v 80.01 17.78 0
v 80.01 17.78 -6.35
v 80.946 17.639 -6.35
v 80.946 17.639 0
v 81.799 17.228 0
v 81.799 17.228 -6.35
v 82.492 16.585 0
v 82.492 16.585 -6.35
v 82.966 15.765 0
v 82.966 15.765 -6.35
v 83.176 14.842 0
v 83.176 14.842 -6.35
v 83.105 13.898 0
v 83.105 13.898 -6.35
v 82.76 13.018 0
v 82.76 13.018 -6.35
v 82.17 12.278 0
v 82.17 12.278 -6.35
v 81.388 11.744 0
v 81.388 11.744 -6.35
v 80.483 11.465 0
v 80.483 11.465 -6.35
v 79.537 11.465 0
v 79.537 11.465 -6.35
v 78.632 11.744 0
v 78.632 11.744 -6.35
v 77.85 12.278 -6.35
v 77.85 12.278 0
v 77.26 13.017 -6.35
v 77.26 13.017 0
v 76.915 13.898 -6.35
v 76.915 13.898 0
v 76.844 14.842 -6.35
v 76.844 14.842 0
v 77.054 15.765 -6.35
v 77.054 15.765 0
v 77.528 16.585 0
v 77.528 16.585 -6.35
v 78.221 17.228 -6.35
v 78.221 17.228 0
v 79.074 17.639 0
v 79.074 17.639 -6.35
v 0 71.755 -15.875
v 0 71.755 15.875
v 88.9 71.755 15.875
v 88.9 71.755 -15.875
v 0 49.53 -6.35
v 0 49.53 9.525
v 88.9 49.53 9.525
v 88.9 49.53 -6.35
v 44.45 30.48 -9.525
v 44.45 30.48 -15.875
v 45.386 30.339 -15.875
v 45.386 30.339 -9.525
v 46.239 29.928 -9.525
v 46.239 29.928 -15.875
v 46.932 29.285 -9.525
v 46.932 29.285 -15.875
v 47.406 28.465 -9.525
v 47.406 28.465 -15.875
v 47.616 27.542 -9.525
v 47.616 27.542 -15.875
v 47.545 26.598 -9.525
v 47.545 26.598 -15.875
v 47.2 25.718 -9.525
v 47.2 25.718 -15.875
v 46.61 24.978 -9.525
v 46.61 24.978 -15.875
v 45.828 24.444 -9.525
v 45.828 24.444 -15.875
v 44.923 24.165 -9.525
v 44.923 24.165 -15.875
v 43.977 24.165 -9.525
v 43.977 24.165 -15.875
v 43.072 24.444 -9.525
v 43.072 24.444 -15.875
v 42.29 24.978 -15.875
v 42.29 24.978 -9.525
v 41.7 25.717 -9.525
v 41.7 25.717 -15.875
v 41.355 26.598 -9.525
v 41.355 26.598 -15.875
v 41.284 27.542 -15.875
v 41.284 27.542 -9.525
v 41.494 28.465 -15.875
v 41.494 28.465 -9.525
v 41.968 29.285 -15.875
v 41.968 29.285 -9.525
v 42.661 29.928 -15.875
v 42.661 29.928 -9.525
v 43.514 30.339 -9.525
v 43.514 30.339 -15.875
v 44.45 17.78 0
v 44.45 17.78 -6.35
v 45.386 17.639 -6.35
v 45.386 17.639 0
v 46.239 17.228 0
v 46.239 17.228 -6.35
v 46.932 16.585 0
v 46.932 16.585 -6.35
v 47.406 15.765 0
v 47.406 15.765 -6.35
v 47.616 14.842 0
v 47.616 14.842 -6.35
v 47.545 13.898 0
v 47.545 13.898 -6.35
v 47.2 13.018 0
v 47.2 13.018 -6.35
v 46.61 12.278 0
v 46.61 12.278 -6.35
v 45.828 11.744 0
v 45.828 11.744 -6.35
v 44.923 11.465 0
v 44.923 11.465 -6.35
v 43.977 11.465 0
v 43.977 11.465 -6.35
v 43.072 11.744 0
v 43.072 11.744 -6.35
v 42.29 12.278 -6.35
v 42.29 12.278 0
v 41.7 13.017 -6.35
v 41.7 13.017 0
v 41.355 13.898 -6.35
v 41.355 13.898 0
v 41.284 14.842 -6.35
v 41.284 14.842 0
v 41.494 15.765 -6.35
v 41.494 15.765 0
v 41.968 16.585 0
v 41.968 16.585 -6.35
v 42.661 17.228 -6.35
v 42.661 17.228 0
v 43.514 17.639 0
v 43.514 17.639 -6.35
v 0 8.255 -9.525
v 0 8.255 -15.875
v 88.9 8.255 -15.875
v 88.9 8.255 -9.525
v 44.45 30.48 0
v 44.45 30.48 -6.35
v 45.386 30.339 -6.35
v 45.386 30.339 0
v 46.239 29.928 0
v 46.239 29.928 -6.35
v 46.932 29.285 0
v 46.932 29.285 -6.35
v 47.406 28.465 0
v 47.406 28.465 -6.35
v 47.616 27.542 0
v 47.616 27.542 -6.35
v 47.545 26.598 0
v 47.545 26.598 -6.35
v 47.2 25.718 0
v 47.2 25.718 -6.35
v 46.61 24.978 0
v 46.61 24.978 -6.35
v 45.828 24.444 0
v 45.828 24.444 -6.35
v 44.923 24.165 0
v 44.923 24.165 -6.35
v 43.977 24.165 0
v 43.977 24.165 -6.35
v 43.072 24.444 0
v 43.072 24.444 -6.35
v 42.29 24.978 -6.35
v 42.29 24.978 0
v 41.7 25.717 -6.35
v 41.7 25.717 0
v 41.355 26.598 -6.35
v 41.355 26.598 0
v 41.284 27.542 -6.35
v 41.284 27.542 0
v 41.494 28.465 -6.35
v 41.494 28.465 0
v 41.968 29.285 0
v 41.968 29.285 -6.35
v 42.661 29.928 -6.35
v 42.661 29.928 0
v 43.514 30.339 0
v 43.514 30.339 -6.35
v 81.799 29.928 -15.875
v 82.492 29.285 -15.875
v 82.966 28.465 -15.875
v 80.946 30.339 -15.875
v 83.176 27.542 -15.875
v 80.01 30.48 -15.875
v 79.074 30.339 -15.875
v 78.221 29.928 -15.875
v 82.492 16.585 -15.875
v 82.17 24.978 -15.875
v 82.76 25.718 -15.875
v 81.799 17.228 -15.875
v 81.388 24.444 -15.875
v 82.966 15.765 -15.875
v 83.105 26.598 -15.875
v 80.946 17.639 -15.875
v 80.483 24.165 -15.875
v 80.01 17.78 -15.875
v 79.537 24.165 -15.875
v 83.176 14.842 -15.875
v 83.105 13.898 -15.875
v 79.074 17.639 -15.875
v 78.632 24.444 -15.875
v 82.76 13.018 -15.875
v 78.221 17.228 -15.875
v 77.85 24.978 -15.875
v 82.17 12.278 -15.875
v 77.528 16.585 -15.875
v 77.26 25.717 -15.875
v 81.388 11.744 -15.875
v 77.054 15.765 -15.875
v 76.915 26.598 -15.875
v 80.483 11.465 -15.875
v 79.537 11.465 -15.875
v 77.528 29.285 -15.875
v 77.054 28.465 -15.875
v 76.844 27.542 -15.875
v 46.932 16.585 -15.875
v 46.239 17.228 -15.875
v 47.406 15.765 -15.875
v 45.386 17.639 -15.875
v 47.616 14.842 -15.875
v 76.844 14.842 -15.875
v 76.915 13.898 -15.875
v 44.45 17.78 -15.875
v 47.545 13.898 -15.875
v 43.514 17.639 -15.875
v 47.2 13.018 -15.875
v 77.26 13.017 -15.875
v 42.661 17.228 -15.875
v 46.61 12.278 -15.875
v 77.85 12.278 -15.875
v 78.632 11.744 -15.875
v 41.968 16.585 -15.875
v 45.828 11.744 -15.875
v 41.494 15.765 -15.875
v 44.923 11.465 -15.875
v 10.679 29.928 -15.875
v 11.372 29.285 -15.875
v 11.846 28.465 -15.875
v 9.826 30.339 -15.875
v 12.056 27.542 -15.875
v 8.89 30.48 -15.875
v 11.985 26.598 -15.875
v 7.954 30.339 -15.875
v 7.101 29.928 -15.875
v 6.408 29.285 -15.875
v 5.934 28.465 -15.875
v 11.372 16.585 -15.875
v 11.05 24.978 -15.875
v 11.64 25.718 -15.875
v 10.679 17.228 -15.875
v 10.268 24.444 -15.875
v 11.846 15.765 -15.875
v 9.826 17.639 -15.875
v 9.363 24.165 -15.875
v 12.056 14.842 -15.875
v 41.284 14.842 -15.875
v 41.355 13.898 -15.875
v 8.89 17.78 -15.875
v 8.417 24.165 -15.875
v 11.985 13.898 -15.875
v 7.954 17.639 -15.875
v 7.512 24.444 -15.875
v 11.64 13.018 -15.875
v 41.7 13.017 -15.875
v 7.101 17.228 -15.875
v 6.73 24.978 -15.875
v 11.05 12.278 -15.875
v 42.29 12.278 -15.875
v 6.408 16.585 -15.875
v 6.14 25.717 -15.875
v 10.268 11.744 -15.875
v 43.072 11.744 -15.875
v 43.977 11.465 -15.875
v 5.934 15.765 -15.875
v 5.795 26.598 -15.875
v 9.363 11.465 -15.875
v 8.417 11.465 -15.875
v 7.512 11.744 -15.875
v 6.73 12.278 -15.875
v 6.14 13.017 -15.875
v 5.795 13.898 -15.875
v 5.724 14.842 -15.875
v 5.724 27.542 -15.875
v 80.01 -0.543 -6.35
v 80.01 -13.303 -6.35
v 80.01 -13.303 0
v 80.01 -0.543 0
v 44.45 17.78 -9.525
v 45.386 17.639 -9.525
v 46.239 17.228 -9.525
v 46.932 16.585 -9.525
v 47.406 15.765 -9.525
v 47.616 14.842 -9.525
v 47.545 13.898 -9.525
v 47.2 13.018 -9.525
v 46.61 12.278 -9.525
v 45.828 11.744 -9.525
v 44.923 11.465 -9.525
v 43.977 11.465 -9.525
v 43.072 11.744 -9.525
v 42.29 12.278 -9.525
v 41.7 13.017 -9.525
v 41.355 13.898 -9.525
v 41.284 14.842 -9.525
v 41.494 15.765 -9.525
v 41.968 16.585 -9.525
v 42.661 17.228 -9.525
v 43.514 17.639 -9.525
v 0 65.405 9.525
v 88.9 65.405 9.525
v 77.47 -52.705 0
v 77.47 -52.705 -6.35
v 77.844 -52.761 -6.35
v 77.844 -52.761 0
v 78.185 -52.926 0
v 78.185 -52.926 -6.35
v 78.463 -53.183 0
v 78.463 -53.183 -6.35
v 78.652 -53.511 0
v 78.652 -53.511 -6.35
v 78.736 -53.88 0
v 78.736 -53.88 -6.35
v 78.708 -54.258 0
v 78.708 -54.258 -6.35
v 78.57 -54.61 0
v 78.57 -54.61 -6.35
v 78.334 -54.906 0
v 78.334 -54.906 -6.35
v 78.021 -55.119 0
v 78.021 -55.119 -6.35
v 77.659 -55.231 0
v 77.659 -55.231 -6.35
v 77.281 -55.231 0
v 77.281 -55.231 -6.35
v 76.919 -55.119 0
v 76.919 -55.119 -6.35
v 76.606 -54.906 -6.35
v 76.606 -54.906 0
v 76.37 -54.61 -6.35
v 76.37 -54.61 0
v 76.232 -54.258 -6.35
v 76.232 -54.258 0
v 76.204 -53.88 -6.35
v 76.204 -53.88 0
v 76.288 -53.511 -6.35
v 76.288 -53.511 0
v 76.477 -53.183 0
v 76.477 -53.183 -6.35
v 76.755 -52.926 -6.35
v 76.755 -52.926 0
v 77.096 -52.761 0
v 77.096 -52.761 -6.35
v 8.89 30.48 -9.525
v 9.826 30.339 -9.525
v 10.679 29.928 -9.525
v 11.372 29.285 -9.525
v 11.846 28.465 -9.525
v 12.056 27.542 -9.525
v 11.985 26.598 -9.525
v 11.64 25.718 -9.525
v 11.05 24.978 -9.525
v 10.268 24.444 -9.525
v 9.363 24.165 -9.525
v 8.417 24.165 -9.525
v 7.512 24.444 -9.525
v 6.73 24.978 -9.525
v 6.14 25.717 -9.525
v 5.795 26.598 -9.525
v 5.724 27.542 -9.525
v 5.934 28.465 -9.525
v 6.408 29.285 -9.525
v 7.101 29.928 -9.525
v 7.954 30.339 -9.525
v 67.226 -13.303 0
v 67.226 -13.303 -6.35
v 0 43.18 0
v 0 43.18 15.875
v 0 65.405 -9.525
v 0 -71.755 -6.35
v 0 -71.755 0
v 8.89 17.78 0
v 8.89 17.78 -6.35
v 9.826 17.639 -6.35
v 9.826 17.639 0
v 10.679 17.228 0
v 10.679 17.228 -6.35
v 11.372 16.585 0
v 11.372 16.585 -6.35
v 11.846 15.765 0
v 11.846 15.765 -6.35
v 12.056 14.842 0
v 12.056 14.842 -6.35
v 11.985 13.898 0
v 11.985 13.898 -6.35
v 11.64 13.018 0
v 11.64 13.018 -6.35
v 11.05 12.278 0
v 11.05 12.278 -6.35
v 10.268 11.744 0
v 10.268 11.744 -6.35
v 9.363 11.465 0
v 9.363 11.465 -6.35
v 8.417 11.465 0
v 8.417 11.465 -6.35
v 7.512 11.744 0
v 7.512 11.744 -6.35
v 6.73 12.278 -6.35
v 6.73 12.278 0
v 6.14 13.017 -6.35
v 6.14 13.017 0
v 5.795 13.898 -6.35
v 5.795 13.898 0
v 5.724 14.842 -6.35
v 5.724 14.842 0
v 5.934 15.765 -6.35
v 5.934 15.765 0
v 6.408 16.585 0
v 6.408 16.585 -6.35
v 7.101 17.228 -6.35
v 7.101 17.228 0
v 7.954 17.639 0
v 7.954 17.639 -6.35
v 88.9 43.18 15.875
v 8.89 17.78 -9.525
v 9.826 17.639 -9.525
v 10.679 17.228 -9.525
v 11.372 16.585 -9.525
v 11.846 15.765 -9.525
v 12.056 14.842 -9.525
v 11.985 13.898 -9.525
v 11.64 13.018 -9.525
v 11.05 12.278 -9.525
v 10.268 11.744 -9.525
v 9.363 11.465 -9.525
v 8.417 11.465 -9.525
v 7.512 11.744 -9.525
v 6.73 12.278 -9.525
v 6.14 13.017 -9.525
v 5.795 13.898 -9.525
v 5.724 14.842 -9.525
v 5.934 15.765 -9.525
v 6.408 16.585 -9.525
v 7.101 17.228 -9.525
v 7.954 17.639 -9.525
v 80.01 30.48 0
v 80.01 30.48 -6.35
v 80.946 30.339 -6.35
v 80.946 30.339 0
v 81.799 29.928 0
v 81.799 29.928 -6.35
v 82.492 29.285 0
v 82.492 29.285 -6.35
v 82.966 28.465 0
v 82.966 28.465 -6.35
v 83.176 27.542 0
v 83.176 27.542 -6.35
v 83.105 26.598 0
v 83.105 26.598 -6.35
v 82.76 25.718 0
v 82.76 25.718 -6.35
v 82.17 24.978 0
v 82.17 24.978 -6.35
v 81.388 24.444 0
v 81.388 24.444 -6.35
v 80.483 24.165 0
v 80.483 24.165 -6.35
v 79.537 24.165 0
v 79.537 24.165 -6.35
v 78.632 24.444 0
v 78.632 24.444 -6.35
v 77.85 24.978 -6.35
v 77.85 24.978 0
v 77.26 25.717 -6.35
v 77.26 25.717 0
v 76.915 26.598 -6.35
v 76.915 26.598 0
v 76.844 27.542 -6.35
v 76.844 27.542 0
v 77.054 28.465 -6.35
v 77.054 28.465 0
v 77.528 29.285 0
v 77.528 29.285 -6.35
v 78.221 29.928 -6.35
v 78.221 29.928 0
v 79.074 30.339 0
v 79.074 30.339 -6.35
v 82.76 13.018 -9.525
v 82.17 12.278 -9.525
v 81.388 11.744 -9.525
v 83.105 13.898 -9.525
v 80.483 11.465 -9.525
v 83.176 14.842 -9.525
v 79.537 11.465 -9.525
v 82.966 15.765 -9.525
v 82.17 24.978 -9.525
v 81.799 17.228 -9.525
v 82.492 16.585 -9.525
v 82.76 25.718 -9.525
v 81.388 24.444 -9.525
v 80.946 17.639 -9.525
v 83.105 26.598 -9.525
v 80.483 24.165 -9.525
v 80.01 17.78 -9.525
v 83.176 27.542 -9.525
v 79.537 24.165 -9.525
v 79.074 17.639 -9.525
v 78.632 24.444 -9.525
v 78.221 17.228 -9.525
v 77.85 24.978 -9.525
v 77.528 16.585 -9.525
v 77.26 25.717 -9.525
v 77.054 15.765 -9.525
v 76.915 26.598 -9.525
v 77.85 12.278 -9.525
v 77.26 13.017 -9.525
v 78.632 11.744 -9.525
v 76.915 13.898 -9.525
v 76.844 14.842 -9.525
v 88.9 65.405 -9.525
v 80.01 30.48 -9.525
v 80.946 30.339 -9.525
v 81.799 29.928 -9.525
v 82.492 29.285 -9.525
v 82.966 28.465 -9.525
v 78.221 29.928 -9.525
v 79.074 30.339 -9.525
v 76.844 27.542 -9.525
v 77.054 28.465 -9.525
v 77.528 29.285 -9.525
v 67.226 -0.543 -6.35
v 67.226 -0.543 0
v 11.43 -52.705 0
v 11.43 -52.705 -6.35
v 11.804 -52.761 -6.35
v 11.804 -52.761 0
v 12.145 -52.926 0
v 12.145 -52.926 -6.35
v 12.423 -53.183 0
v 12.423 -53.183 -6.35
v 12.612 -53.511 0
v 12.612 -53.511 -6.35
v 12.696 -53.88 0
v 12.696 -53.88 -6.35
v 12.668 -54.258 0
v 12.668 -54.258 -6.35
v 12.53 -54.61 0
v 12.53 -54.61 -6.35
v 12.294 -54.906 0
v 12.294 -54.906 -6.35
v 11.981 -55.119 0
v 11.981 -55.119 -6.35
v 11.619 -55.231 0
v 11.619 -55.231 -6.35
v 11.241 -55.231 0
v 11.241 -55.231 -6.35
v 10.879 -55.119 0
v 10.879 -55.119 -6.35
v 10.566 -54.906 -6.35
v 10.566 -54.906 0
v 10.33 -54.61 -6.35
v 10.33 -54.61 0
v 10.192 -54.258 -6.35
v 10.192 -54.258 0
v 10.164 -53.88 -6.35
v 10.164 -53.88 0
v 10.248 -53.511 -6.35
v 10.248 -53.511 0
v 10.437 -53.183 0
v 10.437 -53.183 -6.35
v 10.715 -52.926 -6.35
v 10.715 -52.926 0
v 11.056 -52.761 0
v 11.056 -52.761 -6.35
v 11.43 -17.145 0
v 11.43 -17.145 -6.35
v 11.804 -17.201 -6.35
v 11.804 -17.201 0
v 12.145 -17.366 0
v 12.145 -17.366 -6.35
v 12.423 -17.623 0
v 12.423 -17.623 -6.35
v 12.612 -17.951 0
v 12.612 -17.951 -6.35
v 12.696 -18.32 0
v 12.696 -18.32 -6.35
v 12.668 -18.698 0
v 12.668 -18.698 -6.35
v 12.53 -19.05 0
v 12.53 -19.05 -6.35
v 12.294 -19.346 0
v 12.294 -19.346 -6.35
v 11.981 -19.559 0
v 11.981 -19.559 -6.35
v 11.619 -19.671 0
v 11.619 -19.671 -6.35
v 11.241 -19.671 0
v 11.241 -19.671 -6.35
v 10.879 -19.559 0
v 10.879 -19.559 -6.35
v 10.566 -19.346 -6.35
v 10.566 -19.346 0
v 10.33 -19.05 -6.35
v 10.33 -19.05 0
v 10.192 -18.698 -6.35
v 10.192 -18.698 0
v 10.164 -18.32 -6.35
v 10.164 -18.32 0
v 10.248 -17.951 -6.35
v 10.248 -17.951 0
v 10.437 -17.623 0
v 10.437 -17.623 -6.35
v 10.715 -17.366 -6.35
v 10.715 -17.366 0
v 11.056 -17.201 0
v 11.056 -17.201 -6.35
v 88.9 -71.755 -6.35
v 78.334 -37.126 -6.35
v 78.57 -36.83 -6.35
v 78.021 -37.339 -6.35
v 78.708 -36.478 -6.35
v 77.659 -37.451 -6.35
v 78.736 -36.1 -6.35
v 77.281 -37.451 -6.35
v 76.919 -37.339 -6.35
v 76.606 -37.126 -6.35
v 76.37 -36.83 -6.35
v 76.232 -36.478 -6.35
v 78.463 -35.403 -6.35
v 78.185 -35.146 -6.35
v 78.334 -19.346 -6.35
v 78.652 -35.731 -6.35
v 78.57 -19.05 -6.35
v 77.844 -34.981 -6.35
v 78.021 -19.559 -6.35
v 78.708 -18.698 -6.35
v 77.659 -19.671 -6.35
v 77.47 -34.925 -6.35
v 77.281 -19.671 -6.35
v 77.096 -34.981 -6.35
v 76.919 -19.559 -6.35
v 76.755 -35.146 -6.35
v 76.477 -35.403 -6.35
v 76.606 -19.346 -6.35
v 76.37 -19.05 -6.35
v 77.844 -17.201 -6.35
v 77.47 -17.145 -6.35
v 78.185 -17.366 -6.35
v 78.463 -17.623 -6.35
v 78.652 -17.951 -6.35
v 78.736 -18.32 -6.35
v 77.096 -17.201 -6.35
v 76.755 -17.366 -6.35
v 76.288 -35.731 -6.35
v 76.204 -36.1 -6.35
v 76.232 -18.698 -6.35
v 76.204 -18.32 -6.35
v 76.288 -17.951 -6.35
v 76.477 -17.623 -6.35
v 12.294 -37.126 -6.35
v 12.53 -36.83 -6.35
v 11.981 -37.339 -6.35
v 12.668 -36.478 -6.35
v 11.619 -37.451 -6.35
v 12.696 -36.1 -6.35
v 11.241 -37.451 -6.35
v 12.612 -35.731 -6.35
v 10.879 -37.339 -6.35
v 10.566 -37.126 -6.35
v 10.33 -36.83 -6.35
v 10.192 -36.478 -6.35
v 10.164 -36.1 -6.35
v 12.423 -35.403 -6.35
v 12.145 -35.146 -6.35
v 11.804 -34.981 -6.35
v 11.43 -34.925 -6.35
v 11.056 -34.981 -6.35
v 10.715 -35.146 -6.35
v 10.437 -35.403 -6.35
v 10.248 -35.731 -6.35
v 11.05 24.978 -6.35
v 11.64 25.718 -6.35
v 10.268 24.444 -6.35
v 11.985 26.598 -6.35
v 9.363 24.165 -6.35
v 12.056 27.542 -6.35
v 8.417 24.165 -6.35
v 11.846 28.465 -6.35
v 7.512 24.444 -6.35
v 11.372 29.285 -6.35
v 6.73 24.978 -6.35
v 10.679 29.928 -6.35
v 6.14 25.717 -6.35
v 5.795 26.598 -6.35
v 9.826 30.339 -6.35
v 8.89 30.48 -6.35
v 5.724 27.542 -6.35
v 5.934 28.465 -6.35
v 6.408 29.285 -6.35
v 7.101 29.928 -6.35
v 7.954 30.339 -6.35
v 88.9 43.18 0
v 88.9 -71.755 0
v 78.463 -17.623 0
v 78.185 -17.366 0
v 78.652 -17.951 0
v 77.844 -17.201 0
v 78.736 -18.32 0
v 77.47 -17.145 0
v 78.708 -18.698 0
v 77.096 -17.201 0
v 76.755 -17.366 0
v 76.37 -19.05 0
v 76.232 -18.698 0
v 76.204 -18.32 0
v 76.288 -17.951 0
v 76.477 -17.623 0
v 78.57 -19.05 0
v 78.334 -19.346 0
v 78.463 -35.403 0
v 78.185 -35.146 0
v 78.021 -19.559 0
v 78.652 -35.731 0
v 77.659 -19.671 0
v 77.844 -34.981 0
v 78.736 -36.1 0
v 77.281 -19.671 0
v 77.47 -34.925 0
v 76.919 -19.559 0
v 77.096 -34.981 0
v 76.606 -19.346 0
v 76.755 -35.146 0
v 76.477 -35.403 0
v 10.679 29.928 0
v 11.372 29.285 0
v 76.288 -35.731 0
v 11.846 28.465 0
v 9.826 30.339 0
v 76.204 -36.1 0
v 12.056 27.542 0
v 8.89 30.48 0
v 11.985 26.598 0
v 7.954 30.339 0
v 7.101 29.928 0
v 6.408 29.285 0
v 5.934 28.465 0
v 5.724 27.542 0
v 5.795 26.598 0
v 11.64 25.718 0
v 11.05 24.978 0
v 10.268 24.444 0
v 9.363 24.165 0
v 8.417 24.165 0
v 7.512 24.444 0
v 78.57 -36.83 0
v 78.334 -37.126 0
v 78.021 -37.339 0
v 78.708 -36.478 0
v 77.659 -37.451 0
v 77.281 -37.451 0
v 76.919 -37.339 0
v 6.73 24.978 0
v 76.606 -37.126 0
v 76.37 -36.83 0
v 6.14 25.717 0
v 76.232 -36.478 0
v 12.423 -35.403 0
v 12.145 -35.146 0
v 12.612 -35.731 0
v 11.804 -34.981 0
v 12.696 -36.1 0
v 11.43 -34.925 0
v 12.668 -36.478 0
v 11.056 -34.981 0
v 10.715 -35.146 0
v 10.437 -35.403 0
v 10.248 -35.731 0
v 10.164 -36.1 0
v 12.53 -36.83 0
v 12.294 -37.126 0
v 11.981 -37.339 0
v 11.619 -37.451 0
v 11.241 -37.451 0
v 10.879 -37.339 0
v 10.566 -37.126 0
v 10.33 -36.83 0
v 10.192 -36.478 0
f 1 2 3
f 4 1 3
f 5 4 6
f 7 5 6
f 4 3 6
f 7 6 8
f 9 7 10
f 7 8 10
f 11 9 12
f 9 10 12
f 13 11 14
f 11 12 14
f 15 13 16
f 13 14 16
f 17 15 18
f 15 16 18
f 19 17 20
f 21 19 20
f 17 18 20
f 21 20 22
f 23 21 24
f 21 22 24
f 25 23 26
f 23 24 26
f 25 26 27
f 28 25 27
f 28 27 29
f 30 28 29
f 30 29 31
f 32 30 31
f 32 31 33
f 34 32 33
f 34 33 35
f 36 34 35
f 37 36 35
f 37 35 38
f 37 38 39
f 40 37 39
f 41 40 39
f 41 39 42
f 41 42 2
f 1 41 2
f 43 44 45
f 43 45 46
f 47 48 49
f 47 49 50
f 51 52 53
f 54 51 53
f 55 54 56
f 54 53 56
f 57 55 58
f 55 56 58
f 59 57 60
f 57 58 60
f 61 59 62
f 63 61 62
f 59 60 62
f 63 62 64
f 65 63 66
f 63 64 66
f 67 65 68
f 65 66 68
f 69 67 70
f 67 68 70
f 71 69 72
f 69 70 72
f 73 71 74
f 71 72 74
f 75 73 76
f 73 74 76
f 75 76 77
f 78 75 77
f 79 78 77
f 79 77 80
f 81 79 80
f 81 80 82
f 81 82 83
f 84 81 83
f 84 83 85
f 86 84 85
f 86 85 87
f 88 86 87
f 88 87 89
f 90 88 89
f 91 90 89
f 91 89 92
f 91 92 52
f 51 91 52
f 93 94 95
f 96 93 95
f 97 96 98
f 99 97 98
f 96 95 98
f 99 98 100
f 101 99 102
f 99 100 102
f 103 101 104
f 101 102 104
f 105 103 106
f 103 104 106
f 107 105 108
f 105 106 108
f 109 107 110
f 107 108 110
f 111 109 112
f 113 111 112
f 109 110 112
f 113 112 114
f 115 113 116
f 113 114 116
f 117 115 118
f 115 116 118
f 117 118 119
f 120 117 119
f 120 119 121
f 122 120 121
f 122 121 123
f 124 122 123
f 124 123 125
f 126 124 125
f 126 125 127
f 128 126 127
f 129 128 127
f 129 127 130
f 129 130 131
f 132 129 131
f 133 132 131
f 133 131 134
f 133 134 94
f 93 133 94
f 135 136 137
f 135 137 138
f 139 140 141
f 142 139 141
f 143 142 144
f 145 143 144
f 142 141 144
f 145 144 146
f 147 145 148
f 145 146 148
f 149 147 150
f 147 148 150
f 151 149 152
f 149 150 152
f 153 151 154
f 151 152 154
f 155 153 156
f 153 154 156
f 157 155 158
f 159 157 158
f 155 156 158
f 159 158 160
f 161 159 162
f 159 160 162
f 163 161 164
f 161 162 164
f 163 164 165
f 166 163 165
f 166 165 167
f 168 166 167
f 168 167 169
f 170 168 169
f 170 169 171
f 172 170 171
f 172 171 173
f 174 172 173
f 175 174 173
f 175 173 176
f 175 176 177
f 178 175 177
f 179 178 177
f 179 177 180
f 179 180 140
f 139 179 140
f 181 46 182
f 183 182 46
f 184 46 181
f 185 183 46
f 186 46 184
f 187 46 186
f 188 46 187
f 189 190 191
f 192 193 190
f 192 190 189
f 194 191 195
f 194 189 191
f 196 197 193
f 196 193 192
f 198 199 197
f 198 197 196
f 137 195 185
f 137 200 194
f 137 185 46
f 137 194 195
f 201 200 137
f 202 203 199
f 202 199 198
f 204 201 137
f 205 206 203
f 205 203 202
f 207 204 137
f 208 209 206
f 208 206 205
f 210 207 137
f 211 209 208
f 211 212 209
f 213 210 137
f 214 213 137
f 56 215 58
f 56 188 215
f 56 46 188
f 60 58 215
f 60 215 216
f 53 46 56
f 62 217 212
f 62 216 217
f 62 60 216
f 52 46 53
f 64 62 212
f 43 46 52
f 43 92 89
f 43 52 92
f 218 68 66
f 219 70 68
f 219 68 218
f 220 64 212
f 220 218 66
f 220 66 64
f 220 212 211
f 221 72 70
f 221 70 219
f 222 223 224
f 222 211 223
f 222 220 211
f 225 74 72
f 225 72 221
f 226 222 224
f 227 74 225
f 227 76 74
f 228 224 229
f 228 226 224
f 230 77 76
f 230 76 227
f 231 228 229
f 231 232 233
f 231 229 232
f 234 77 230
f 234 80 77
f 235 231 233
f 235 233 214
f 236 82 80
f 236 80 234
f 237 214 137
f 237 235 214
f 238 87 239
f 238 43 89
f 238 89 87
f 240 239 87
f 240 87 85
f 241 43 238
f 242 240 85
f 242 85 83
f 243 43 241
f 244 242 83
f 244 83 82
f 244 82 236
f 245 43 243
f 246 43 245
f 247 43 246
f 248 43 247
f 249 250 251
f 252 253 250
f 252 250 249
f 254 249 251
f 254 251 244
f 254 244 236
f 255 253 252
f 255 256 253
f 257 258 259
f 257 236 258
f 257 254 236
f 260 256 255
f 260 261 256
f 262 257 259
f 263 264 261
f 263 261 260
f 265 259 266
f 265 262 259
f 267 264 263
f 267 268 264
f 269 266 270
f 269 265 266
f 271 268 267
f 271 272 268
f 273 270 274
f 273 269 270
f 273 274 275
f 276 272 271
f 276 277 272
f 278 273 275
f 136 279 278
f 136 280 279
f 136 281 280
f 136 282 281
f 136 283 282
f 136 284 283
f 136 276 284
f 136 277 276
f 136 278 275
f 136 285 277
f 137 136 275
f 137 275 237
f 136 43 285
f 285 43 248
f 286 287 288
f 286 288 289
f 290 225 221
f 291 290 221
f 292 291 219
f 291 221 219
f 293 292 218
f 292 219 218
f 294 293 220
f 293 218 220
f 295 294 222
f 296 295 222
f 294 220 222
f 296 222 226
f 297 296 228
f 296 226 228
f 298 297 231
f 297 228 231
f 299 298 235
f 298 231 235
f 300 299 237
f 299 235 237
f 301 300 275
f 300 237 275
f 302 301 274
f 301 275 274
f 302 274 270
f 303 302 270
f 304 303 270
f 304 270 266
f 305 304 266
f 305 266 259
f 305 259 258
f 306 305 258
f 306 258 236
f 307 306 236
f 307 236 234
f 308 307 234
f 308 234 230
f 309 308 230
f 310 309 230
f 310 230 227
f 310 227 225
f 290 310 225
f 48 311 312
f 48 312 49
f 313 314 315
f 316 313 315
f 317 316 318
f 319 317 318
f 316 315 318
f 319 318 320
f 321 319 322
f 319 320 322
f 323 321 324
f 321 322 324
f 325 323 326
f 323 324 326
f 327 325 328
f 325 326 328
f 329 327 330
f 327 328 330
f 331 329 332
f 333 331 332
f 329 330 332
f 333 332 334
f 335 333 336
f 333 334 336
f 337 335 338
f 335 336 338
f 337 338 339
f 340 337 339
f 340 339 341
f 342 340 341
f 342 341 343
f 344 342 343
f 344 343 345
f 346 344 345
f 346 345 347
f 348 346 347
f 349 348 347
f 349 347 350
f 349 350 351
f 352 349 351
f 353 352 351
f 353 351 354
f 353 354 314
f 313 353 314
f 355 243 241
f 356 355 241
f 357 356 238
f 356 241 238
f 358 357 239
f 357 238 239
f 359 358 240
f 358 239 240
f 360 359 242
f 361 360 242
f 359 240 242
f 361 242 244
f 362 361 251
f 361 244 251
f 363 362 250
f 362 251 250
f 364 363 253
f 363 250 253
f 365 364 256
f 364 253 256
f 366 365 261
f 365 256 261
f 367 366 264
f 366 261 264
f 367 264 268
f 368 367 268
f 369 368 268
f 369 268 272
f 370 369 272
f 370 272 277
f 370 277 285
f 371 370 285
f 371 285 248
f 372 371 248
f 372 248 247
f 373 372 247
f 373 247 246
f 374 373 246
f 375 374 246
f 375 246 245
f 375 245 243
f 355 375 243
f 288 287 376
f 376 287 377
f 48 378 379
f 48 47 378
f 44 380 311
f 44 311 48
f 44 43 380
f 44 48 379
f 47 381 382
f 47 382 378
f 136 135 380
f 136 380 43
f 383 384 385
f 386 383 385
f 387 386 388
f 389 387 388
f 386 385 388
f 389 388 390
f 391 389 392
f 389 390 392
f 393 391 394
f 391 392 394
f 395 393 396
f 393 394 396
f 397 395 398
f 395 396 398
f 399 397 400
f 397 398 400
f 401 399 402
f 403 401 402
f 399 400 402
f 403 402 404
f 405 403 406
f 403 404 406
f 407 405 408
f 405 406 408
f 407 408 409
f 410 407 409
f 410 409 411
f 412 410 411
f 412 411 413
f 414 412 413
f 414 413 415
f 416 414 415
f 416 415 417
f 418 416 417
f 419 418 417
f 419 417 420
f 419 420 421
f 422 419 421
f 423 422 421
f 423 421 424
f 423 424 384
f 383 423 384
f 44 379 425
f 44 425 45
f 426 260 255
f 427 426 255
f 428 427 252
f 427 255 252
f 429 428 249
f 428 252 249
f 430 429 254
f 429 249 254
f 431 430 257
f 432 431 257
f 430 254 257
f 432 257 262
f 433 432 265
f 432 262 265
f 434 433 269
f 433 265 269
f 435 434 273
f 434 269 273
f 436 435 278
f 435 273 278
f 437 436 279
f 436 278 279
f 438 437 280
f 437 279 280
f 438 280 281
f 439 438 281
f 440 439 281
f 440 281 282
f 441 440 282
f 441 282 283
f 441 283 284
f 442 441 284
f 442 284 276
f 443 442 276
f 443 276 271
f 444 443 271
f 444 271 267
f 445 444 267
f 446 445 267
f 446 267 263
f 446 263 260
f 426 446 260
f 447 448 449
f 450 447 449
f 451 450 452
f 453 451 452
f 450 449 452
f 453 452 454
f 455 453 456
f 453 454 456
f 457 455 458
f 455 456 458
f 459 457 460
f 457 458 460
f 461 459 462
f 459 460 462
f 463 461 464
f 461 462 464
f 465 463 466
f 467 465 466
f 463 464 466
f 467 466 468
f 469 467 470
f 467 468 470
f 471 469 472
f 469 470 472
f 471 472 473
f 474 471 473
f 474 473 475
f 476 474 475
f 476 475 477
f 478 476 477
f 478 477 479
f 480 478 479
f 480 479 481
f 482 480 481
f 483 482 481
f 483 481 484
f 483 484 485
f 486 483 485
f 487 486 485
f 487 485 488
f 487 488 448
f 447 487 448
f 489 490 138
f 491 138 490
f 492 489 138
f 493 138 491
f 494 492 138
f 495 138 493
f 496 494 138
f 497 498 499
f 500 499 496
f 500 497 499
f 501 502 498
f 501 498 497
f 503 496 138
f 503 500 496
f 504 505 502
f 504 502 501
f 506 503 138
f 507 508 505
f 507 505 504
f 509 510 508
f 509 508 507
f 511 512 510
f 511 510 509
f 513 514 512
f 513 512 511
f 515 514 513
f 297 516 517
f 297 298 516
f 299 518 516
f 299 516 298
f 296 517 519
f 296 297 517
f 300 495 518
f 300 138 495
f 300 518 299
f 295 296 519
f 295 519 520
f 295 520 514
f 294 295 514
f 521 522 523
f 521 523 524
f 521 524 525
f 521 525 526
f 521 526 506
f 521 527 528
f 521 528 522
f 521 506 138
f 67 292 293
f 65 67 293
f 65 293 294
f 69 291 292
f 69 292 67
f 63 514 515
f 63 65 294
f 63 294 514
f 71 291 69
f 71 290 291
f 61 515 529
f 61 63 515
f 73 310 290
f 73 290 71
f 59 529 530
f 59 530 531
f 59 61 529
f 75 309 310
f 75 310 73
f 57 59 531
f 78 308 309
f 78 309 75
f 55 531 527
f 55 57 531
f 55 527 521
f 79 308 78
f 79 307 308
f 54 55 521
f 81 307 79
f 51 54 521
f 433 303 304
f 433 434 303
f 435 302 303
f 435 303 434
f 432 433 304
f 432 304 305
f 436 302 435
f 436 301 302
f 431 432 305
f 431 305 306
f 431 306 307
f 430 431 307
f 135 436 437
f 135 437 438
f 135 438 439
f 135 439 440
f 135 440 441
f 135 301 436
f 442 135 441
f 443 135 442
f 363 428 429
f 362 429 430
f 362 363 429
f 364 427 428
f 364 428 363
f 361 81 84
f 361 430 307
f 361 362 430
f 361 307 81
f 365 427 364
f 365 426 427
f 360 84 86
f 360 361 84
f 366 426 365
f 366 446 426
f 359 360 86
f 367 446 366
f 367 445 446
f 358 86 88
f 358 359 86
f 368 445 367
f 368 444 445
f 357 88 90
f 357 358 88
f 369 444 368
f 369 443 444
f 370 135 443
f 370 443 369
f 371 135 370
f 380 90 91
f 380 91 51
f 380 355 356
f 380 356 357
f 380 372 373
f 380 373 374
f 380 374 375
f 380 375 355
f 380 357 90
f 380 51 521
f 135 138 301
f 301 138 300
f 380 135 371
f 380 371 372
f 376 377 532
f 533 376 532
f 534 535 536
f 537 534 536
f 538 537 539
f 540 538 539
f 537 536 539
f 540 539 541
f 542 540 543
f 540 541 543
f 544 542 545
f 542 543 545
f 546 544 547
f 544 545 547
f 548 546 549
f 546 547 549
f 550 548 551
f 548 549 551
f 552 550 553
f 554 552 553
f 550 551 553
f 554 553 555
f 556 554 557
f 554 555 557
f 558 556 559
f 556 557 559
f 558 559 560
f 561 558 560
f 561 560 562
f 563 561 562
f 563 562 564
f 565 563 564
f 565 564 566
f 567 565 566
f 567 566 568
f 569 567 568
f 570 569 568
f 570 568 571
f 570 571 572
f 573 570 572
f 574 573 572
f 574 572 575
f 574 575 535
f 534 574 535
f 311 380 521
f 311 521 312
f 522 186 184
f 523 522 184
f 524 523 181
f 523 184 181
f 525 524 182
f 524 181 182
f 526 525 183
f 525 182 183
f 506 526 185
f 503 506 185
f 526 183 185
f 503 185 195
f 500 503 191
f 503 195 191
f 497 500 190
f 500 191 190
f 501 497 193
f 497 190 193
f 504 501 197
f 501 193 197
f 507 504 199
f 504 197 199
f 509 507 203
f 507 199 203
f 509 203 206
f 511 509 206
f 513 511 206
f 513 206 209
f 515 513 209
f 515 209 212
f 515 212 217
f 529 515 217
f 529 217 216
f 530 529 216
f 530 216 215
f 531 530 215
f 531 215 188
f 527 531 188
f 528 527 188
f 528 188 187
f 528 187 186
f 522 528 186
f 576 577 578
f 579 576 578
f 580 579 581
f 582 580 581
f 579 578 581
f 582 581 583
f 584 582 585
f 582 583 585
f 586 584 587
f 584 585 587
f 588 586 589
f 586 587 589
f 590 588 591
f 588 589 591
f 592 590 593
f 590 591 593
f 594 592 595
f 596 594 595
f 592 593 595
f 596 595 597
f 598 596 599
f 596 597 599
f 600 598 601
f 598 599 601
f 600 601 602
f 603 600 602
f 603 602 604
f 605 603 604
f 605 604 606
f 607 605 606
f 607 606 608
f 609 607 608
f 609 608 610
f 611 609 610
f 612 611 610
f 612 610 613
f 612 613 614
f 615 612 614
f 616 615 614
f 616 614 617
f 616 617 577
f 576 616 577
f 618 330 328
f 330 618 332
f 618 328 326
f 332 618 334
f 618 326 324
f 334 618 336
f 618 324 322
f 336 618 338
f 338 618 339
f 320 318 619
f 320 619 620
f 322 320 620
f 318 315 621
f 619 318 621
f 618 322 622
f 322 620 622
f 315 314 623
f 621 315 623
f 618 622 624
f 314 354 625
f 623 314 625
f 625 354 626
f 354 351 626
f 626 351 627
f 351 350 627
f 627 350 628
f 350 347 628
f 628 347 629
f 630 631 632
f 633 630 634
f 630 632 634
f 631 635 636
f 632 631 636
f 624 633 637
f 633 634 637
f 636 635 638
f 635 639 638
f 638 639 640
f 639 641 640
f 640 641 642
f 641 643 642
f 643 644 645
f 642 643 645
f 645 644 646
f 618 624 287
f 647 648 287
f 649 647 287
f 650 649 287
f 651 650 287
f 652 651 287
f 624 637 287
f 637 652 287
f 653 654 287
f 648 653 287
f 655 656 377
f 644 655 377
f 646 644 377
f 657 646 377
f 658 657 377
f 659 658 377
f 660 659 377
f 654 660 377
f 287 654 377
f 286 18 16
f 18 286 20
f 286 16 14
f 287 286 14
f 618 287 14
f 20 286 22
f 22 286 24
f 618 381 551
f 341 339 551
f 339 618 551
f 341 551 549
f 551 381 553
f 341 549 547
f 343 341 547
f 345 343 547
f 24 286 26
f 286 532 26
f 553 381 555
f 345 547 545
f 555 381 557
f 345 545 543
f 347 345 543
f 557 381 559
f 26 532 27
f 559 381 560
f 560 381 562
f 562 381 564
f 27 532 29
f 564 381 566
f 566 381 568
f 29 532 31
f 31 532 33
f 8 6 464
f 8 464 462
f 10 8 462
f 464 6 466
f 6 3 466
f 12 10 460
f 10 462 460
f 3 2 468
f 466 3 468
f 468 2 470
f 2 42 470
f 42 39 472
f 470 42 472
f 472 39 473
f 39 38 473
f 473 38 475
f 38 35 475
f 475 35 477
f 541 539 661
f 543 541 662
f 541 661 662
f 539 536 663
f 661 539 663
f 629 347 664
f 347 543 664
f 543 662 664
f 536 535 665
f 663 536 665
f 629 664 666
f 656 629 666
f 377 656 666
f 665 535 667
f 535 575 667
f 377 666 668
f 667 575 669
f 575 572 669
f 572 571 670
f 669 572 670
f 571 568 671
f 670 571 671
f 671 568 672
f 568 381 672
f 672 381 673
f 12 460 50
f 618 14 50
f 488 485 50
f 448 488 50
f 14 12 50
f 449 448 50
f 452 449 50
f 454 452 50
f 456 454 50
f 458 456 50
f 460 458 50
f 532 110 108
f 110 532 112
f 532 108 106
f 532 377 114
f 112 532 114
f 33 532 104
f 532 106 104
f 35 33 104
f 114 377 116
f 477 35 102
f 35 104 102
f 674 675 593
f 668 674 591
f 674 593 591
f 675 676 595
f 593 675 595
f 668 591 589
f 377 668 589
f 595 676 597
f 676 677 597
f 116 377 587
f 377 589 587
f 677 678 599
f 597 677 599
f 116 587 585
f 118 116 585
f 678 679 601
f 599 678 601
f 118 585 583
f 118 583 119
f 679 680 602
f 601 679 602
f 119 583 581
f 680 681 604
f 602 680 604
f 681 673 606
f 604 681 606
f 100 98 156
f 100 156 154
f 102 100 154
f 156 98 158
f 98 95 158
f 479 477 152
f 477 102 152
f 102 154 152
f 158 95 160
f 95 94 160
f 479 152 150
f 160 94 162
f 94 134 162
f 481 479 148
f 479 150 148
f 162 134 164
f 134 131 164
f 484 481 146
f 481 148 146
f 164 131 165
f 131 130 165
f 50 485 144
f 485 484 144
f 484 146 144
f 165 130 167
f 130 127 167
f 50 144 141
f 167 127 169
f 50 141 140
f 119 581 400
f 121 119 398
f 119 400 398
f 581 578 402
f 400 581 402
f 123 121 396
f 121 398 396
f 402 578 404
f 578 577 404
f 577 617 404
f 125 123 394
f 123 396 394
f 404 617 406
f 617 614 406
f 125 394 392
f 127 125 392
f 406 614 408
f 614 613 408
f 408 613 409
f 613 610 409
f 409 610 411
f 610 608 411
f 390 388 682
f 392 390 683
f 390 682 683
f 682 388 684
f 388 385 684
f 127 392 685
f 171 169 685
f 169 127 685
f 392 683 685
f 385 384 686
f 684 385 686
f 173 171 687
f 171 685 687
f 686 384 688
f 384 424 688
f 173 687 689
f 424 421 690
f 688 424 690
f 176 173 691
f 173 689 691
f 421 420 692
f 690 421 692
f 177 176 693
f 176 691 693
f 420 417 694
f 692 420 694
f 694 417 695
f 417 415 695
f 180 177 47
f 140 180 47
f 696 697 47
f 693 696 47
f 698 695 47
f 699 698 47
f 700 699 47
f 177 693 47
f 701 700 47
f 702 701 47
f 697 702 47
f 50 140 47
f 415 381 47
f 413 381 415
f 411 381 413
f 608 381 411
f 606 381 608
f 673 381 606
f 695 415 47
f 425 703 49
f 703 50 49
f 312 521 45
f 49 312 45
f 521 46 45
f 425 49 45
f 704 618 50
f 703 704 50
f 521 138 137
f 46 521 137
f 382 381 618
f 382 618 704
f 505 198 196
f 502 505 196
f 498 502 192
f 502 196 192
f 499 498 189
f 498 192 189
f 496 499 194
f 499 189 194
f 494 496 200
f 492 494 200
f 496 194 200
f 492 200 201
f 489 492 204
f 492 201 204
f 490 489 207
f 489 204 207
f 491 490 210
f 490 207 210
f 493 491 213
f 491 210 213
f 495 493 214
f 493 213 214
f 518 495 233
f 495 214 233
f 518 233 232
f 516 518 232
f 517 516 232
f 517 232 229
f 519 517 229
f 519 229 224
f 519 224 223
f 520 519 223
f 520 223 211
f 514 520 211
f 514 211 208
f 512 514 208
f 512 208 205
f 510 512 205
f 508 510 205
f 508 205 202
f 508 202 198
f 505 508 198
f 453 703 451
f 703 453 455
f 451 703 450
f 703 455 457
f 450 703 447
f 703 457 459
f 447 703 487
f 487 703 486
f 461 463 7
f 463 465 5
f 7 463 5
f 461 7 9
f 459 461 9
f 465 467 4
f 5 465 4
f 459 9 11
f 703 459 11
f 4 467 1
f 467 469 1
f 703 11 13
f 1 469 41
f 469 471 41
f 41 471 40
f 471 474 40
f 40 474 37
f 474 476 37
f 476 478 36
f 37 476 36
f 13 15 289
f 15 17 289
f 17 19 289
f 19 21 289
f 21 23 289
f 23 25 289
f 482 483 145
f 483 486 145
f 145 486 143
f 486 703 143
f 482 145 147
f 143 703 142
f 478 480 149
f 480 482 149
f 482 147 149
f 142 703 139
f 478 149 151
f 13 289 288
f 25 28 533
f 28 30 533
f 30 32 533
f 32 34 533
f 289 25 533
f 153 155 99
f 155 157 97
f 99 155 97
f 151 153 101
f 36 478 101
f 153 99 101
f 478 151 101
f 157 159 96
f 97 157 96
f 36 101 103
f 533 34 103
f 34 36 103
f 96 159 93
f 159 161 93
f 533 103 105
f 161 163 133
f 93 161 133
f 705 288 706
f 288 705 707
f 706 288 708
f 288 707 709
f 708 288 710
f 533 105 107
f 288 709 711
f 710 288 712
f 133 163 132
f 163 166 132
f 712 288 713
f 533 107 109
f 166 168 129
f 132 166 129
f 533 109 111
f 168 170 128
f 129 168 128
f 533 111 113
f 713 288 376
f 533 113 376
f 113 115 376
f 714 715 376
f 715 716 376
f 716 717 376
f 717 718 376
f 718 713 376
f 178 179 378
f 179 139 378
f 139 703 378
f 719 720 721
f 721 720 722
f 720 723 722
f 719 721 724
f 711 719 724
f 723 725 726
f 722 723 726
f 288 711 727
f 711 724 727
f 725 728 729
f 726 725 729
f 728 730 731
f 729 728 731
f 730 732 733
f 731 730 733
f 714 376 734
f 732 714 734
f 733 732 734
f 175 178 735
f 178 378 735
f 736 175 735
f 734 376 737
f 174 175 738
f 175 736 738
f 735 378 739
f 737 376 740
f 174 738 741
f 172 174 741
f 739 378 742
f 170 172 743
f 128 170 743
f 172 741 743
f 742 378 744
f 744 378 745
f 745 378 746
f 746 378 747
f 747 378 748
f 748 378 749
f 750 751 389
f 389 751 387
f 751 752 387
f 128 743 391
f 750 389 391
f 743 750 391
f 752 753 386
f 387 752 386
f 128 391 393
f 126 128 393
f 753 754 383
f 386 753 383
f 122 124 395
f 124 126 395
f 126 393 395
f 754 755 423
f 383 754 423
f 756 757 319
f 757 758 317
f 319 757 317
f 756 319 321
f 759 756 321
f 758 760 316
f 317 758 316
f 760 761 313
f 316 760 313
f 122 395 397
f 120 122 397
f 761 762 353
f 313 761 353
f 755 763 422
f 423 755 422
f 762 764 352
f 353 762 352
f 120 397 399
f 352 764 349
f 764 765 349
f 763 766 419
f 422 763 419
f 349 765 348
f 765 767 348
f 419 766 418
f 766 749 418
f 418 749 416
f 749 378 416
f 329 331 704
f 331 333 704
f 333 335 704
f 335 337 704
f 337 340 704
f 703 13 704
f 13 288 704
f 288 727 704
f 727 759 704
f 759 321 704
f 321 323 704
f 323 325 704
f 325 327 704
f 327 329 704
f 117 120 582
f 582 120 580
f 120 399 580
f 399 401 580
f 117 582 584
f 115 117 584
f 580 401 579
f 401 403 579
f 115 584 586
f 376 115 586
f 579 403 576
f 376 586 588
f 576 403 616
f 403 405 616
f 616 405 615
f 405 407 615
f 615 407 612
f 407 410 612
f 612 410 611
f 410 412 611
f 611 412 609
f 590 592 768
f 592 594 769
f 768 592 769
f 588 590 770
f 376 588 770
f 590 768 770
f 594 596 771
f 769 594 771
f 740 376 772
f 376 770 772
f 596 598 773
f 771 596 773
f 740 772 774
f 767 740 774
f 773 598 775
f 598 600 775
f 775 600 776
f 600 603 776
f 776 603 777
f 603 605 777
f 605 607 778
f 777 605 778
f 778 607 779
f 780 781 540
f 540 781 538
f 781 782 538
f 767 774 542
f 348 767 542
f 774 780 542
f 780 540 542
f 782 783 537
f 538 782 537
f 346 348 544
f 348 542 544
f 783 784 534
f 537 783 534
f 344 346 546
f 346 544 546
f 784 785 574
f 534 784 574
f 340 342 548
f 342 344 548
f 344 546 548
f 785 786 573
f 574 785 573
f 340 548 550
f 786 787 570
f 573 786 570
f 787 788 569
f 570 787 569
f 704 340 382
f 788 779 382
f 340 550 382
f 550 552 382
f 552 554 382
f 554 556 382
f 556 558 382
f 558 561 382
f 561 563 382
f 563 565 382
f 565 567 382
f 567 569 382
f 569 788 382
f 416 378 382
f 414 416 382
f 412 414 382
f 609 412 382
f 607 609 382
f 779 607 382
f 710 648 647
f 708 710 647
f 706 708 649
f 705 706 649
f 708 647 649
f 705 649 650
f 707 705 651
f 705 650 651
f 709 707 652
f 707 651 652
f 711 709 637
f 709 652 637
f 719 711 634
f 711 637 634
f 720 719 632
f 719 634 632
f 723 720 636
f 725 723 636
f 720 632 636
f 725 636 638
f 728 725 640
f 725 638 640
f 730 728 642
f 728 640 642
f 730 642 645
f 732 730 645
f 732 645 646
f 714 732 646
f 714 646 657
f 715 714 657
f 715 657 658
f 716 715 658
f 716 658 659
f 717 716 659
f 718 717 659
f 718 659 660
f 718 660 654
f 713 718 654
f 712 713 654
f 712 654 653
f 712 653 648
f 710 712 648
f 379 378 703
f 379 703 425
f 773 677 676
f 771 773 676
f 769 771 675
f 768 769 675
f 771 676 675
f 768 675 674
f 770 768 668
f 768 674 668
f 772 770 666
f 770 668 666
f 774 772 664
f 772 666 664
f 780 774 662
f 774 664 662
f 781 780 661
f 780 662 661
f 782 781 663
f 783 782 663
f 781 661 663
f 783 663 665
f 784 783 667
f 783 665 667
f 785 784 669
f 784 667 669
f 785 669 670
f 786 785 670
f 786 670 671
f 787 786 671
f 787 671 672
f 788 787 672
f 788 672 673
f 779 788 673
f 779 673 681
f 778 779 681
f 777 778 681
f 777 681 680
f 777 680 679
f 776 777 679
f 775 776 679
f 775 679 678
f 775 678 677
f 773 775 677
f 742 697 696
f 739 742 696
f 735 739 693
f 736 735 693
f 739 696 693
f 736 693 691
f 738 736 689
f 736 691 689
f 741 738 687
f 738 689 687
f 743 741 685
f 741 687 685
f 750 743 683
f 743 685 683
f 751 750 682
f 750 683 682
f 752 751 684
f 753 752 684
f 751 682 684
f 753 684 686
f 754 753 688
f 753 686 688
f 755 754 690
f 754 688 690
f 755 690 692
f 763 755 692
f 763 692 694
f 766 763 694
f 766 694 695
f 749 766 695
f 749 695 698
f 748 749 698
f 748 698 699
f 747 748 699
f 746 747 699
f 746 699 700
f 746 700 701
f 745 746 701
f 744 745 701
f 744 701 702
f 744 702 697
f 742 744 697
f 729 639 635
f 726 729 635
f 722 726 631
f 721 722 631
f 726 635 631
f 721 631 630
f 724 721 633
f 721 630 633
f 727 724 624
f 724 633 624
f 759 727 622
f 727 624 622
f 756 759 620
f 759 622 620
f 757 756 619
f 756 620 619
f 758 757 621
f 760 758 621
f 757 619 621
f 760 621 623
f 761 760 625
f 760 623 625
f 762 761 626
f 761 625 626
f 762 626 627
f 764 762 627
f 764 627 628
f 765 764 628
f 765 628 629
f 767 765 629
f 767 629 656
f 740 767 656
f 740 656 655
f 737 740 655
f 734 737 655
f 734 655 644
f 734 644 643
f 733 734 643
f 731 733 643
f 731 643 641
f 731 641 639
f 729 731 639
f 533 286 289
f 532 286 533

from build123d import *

# Parameters (mm, degrees)
BOSS_EXTRUDE1_DEPTH = 88.9
SKETCH2_R           = 3.175
SKETCH2_R_2         = 1.27
SKETCH2_W           = 12.784255415
SKETCH2_H           = 12.760259732
CUT_EXTRUDE1_DEPTH  = 81.28


with BuildPart() as part:
    # Sketch1 → Boss-Extrude1 (new body)
    with BuildSketch(Plane(origin=(0, 0, 0), x_dir=(0, 0, -1), z_dir=(1, 0, 0))):
        Polygon((6.35, 11.43), (6.35, -71.755), (0, -71.755), (0, 11.43), (0, 43.18), (-15.875, 43.18), (-15.875, 71.755), (15.875, 71.755), (15.875, 8.255), (9.525, 8.255), (9.525, 65.405), (-9.525, 65.405), (-9.525, 49.53), (6.35, 49.53), align=None)
    extrude(amount=BOSS_EXTRUDE1_DEPTH)

    # Sketch2 → Cut-Extrude1 (cut)
    with BuildSketch(Plane(origin=(0, 0, -15.875), x_dir=(-1, 0, 0), z_dir=(0, 0, -1))):
        with Locations(Location((-44.45, 27.305, 0), (0, 0, 90))):
            Circle(SKETCH2_R)
        with Locations(Location((-80.01, 27.305, 0), (0, 0, 90))):
            Circle(SKETCH2_R)
        with Locations(Location((-80.01, 14.605, 0), (0, 0, 90))):
            Circle(SKETCH2_R)
        with Locations(Location((-44.45, 14.605, 0), (0, 0, 90))):
            Circle(SKETCH2_R)
        with Locations(Location((-8.89, 14.605, 0), (0, 0, 90))):
            Circle(SKETCH2_R)
        with Locations(Location((-8.89, 27.305, 0), (0, 0, 90))):
            Circle(SKETCH2_R)
        with Locations(Location((-77.47, -18.415, 0), (0, 0, 90))):
            Circle(SKETCH2_R_2)
        with Locations(Location((-77.47, -36.195, 0), (0, 0, 90))):
            Circle(SKETCH2_R_2)
        with Locations(Location((-77.47, -53.975, 0), (0, 0, 90))):
            Circle(SKETCH2_R_2)
        with Locations(Location((-11.43, -53.975, 0), (0, 0, 90))):
            Circle(SKETCH2_R_2)
        with Locations(Location((-11.43, -36.195, 0), (0, 0, 90))):
            Circle(SKETCH2_R_2)
        with Locations(Location((-11.43, -18.415, 0), (0, 0, 90))):
            Circle(SKETCH2_R_2)
        with Locations((-73.617872293, -6.922794841)):
            Rectangle(SKETCH2_W, SKETCH2_H)
    extrude(amount=-CUT_EXTRUDE1_DEPTH, mode=Mode.SUBTRACT)


solid = part.part
